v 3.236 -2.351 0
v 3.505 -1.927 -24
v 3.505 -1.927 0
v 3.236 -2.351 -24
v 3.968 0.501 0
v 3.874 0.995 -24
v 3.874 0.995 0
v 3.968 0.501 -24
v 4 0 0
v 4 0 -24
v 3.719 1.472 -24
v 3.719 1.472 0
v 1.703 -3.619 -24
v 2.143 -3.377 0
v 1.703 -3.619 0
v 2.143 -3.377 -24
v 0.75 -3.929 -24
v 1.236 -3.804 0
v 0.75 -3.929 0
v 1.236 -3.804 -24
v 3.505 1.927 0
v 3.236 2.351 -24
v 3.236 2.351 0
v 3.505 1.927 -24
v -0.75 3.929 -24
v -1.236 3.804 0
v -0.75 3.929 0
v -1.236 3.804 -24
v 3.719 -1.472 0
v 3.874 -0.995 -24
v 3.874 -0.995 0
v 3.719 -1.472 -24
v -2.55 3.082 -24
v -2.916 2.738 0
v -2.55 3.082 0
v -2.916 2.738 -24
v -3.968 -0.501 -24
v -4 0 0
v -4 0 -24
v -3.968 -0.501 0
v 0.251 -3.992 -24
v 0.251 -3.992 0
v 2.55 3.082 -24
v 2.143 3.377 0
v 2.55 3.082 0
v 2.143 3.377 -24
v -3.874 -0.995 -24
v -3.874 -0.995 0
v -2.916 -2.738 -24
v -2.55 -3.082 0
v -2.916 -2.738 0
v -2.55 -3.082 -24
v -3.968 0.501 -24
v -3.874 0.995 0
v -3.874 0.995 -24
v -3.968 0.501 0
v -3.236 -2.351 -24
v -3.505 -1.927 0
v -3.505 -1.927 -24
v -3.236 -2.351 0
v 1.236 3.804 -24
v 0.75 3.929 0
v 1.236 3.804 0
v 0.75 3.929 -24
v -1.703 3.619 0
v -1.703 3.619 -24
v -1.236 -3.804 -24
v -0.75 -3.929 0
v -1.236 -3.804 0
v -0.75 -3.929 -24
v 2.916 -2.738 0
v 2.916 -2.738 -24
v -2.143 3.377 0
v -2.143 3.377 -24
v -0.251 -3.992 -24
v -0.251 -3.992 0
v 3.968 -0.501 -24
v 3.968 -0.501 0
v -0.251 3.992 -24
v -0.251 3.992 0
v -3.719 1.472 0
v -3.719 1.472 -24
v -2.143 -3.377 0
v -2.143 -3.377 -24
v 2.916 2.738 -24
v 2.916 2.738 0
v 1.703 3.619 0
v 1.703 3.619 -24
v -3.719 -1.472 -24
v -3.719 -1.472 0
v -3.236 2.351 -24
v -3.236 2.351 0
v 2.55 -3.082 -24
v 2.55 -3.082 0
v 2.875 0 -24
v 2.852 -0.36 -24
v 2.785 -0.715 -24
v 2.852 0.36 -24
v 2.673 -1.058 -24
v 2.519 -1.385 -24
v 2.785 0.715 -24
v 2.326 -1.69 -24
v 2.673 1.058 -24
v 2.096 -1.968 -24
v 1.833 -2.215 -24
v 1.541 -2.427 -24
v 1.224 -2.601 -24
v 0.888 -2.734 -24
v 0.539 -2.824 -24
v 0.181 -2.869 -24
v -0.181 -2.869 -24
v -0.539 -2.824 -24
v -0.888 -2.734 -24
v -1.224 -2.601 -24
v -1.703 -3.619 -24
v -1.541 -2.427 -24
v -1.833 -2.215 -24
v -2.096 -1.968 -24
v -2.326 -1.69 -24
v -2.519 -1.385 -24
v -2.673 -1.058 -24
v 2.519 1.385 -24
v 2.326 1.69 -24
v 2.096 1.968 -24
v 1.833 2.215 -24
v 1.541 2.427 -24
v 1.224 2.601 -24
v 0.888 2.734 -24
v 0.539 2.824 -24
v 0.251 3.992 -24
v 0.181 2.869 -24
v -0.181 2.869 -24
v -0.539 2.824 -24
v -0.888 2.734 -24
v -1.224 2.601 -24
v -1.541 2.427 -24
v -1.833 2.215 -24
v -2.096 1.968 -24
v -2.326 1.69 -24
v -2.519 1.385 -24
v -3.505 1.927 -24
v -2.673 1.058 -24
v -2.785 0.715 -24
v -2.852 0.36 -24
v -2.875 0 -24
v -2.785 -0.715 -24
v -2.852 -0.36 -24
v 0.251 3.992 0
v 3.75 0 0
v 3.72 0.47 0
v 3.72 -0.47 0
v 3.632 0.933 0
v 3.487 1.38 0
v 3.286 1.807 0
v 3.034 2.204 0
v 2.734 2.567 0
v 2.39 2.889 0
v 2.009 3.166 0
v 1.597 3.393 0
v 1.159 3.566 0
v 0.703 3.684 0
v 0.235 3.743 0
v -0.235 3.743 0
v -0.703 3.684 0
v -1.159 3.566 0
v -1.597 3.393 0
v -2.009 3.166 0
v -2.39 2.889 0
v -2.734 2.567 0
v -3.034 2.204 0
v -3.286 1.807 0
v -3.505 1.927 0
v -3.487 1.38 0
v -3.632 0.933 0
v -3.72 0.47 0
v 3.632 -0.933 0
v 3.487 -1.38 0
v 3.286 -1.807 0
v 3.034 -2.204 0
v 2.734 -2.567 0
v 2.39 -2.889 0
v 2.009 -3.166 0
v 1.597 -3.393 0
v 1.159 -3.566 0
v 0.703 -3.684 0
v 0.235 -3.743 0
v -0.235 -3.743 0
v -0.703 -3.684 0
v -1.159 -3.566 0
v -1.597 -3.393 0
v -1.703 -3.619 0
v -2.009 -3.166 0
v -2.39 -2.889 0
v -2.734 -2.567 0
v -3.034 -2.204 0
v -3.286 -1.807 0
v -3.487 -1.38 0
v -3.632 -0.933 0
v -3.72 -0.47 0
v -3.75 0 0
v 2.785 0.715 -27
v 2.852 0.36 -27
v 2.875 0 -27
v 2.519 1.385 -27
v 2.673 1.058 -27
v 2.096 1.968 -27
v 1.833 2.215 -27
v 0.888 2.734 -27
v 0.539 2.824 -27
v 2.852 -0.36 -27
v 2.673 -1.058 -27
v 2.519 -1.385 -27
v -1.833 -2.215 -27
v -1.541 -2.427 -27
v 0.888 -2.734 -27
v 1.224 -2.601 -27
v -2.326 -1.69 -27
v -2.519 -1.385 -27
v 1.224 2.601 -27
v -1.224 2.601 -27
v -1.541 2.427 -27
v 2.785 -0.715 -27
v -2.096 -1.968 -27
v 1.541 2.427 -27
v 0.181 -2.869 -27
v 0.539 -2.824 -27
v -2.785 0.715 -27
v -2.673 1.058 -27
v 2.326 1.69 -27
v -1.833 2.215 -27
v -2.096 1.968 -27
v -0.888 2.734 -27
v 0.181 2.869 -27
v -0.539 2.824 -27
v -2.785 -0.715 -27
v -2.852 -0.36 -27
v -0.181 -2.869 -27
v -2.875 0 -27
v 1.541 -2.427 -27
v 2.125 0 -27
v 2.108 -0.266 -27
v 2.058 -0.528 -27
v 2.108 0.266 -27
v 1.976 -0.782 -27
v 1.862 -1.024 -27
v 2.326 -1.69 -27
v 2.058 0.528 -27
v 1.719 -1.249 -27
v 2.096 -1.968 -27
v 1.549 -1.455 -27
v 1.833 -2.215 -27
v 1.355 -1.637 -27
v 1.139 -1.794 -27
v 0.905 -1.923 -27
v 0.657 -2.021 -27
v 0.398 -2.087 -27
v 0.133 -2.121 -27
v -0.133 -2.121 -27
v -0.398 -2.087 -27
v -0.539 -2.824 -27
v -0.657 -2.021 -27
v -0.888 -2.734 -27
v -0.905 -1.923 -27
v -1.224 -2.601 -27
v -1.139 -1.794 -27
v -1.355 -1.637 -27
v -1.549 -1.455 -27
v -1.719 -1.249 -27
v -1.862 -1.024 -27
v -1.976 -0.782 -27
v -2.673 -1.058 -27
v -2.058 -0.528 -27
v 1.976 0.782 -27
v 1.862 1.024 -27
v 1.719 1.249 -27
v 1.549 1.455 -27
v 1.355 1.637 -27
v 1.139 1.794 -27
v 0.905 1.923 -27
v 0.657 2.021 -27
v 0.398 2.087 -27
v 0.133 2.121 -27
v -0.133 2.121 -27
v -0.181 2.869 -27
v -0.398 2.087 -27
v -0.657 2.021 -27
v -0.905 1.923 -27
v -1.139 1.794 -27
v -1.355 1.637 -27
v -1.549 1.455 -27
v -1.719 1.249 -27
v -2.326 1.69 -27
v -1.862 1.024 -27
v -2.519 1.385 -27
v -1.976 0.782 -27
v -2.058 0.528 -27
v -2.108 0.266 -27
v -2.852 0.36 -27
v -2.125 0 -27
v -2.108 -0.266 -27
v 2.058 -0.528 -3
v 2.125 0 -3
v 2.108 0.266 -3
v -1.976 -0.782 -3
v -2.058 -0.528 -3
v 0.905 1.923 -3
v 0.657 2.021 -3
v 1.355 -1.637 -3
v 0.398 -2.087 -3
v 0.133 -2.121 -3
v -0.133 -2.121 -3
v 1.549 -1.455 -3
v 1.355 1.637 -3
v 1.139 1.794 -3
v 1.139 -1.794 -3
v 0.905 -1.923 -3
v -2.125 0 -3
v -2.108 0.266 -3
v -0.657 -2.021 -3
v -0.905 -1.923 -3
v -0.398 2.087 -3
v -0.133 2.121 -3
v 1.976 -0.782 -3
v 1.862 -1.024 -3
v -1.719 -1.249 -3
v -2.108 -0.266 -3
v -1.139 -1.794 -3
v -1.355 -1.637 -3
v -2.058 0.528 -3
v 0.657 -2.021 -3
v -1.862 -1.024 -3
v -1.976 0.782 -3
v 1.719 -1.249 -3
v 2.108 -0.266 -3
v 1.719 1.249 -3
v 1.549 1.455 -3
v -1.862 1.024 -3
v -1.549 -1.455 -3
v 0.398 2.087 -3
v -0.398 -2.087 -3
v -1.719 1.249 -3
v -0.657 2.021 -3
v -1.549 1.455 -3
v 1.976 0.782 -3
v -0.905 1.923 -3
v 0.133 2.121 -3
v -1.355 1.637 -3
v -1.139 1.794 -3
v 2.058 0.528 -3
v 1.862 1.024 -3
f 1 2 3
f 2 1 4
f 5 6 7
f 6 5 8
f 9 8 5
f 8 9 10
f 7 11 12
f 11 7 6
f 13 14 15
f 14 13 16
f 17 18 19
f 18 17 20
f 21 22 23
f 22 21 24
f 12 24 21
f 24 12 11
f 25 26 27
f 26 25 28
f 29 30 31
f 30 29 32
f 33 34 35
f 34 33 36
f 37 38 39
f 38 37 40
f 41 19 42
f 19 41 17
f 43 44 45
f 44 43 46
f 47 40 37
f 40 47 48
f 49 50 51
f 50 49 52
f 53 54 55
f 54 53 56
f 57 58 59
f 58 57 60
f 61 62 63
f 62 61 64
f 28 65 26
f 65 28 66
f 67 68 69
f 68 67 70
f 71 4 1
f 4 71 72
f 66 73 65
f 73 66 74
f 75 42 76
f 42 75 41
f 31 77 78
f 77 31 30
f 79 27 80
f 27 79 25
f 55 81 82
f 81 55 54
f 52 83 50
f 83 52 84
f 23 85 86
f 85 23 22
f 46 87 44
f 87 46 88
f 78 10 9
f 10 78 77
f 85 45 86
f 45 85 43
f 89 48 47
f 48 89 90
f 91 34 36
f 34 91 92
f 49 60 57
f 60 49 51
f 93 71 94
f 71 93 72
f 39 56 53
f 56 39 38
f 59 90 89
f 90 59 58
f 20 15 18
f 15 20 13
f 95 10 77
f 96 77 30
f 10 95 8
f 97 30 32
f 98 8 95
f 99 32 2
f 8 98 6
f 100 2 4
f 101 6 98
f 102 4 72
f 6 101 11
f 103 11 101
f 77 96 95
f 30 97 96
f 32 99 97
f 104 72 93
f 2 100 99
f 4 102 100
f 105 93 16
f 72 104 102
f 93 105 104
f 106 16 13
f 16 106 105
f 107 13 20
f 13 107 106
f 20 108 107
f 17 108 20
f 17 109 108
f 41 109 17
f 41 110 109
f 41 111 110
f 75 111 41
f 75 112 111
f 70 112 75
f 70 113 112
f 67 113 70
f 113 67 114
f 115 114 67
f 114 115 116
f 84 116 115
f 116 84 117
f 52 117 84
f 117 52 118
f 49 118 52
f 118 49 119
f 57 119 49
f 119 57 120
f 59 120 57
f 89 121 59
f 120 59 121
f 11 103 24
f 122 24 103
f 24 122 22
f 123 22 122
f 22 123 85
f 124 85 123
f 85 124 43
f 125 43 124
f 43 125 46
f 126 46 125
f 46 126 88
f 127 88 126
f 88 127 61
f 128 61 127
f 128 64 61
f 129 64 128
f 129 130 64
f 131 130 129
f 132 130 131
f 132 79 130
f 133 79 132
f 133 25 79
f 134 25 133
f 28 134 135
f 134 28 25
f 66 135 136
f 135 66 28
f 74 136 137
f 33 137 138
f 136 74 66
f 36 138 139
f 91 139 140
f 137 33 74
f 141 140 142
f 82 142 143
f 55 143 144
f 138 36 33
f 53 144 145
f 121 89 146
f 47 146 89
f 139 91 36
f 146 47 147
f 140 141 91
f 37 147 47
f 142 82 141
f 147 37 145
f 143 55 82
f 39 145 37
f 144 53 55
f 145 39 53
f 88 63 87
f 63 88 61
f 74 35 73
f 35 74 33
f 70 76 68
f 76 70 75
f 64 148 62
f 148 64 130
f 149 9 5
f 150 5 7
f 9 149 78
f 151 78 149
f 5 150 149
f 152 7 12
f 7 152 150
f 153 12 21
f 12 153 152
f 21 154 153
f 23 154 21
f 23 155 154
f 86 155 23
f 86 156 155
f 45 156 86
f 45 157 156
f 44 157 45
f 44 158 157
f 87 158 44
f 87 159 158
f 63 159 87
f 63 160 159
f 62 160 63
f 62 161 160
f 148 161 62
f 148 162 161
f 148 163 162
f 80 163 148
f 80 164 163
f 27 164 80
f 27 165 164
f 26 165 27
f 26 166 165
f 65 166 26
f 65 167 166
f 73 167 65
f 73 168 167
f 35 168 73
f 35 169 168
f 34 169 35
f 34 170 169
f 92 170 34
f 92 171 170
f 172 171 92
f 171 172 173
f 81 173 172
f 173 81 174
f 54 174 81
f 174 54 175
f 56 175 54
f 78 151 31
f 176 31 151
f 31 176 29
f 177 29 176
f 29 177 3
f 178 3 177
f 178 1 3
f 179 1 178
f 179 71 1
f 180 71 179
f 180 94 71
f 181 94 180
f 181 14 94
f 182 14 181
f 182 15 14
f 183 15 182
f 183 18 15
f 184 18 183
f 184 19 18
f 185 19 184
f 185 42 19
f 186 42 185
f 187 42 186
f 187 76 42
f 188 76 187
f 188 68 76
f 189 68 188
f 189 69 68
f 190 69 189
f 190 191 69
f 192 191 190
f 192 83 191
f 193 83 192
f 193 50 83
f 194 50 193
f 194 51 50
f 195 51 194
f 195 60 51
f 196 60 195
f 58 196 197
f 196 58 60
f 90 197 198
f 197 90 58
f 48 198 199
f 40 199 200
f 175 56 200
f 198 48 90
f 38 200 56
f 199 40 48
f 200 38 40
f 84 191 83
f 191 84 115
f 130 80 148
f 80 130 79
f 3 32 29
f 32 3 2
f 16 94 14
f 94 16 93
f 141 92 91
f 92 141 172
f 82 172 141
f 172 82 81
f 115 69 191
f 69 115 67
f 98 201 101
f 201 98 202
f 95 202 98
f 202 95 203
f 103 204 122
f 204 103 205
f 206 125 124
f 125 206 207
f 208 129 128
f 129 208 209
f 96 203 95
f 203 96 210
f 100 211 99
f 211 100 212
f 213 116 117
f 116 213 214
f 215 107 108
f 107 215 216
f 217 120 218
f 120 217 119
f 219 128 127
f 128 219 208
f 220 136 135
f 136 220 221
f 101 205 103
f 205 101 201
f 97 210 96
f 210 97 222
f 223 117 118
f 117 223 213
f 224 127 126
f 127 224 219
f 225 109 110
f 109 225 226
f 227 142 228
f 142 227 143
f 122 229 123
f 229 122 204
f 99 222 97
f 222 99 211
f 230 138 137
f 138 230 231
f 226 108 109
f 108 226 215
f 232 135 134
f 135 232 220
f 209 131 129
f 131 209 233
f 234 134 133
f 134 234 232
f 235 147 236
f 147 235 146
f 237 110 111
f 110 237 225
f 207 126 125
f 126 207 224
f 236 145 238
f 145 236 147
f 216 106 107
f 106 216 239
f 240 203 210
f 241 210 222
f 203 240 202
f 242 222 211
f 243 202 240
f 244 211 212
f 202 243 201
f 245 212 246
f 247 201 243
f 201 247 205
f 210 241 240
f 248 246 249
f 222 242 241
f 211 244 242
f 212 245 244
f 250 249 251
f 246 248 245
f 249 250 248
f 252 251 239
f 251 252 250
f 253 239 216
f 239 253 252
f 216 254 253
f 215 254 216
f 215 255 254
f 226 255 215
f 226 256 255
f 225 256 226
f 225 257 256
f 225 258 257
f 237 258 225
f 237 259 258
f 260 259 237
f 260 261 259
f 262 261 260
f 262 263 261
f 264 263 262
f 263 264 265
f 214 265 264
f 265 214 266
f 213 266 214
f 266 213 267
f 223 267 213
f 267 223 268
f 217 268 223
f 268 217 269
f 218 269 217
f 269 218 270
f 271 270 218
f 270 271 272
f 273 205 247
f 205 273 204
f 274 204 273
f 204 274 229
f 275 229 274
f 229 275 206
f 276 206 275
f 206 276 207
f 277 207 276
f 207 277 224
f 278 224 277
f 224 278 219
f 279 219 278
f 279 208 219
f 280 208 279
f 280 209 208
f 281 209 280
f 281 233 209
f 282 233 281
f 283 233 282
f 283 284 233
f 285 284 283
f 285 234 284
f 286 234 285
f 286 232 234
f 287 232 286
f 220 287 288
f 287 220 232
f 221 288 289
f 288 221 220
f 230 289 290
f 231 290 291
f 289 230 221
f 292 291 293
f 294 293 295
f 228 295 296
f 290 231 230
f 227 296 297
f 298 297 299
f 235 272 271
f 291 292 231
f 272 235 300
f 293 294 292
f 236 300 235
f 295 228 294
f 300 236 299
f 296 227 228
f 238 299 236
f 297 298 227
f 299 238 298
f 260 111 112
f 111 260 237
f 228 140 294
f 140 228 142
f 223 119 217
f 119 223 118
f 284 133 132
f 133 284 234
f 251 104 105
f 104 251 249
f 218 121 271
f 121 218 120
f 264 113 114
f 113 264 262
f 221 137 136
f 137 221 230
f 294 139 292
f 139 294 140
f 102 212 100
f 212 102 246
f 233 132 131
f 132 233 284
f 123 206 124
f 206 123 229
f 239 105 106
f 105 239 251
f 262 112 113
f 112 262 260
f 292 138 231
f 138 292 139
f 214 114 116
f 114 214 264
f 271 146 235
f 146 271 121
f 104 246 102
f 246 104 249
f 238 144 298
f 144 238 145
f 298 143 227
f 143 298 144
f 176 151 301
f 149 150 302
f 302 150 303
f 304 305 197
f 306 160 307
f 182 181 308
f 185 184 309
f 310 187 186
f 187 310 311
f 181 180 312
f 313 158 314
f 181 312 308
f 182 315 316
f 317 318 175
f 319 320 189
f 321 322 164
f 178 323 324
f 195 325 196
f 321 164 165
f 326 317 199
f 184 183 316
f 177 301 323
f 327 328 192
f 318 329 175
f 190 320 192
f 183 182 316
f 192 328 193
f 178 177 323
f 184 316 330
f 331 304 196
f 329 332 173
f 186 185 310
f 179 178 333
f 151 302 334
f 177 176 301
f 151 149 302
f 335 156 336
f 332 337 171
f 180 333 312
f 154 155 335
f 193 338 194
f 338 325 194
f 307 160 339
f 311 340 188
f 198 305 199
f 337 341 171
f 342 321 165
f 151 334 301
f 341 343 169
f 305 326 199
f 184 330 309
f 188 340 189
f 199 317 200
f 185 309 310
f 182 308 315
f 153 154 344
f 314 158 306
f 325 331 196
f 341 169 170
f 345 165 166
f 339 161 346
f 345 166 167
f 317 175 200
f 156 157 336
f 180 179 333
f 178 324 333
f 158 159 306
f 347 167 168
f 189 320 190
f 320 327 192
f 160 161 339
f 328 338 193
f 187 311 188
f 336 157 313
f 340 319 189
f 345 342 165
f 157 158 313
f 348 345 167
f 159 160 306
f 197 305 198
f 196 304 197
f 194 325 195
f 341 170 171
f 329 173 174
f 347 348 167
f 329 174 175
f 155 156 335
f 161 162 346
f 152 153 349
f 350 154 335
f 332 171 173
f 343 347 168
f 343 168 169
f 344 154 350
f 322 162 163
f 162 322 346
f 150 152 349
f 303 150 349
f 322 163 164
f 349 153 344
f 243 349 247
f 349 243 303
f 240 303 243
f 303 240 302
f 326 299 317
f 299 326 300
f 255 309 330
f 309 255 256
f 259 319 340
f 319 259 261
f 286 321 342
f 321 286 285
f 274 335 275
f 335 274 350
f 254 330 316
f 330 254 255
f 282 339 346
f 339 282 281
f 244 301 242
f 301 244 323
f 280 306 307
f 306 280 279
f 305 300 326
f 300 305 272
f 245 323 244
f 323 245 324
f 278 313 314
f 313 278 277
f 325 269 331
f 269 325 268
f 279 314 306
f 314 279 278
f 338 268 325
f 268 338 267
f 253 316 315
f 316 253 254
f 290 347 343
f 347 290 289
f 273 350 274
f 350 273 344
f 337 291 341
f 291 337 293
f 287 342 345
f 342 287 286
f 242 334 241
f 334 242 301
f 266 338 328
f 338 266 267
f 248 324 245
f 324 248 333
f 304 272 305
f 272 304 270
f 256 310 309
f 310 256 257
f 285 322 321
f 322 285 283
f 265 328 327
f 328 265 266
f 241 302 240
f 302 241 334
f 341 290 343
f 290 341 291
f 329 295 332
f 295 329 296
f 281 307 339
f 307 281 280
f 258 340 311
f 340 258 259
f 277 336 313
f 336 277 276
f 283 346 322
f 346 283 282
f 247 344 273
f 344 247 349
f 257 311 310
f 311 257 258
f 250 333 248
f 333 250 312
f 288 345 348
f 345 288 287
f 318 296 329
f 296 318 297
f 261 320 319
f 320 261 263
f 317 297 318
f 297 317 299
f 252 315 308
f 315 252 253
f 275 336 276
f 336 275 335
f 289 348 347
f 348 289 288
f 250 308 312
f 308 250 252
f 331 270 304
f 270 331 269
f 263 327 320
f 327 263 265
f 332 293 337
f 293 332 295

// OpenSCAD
$fn = 50;

difference() {
	union() {
		translate(v = [0, 0, -24.0]) {
			cylinder(h = 24, r = 4.0);
		}
		#translate(v = [0, 0, -27.0]) {
			cylinder(h = 27, r = 2.875);
		}
	}
	union() {
		translate(v = [0, 0, 0]) {
			rotate(a = [0, 0, 0]) {
				difference() {
					union() {
						translate(v = [0, 0, -27.0]) {
							cylinder(h = 27, r = 2.0);
						}
						translate(v = [0, 0, -3]) {
							cylinder(h = 3, r1 = 2.125, r2 = 3.75);
						}
						translate(v = [0, 0, -27.0]) {
							cylinder(h = 27, r = 2.125);
						}
						translate(v = [0, 0, -27.0]) {
							cylinder(h = 27, r = 2.0);
						}
					}
					union();
				}
			}
		}
	}
}
